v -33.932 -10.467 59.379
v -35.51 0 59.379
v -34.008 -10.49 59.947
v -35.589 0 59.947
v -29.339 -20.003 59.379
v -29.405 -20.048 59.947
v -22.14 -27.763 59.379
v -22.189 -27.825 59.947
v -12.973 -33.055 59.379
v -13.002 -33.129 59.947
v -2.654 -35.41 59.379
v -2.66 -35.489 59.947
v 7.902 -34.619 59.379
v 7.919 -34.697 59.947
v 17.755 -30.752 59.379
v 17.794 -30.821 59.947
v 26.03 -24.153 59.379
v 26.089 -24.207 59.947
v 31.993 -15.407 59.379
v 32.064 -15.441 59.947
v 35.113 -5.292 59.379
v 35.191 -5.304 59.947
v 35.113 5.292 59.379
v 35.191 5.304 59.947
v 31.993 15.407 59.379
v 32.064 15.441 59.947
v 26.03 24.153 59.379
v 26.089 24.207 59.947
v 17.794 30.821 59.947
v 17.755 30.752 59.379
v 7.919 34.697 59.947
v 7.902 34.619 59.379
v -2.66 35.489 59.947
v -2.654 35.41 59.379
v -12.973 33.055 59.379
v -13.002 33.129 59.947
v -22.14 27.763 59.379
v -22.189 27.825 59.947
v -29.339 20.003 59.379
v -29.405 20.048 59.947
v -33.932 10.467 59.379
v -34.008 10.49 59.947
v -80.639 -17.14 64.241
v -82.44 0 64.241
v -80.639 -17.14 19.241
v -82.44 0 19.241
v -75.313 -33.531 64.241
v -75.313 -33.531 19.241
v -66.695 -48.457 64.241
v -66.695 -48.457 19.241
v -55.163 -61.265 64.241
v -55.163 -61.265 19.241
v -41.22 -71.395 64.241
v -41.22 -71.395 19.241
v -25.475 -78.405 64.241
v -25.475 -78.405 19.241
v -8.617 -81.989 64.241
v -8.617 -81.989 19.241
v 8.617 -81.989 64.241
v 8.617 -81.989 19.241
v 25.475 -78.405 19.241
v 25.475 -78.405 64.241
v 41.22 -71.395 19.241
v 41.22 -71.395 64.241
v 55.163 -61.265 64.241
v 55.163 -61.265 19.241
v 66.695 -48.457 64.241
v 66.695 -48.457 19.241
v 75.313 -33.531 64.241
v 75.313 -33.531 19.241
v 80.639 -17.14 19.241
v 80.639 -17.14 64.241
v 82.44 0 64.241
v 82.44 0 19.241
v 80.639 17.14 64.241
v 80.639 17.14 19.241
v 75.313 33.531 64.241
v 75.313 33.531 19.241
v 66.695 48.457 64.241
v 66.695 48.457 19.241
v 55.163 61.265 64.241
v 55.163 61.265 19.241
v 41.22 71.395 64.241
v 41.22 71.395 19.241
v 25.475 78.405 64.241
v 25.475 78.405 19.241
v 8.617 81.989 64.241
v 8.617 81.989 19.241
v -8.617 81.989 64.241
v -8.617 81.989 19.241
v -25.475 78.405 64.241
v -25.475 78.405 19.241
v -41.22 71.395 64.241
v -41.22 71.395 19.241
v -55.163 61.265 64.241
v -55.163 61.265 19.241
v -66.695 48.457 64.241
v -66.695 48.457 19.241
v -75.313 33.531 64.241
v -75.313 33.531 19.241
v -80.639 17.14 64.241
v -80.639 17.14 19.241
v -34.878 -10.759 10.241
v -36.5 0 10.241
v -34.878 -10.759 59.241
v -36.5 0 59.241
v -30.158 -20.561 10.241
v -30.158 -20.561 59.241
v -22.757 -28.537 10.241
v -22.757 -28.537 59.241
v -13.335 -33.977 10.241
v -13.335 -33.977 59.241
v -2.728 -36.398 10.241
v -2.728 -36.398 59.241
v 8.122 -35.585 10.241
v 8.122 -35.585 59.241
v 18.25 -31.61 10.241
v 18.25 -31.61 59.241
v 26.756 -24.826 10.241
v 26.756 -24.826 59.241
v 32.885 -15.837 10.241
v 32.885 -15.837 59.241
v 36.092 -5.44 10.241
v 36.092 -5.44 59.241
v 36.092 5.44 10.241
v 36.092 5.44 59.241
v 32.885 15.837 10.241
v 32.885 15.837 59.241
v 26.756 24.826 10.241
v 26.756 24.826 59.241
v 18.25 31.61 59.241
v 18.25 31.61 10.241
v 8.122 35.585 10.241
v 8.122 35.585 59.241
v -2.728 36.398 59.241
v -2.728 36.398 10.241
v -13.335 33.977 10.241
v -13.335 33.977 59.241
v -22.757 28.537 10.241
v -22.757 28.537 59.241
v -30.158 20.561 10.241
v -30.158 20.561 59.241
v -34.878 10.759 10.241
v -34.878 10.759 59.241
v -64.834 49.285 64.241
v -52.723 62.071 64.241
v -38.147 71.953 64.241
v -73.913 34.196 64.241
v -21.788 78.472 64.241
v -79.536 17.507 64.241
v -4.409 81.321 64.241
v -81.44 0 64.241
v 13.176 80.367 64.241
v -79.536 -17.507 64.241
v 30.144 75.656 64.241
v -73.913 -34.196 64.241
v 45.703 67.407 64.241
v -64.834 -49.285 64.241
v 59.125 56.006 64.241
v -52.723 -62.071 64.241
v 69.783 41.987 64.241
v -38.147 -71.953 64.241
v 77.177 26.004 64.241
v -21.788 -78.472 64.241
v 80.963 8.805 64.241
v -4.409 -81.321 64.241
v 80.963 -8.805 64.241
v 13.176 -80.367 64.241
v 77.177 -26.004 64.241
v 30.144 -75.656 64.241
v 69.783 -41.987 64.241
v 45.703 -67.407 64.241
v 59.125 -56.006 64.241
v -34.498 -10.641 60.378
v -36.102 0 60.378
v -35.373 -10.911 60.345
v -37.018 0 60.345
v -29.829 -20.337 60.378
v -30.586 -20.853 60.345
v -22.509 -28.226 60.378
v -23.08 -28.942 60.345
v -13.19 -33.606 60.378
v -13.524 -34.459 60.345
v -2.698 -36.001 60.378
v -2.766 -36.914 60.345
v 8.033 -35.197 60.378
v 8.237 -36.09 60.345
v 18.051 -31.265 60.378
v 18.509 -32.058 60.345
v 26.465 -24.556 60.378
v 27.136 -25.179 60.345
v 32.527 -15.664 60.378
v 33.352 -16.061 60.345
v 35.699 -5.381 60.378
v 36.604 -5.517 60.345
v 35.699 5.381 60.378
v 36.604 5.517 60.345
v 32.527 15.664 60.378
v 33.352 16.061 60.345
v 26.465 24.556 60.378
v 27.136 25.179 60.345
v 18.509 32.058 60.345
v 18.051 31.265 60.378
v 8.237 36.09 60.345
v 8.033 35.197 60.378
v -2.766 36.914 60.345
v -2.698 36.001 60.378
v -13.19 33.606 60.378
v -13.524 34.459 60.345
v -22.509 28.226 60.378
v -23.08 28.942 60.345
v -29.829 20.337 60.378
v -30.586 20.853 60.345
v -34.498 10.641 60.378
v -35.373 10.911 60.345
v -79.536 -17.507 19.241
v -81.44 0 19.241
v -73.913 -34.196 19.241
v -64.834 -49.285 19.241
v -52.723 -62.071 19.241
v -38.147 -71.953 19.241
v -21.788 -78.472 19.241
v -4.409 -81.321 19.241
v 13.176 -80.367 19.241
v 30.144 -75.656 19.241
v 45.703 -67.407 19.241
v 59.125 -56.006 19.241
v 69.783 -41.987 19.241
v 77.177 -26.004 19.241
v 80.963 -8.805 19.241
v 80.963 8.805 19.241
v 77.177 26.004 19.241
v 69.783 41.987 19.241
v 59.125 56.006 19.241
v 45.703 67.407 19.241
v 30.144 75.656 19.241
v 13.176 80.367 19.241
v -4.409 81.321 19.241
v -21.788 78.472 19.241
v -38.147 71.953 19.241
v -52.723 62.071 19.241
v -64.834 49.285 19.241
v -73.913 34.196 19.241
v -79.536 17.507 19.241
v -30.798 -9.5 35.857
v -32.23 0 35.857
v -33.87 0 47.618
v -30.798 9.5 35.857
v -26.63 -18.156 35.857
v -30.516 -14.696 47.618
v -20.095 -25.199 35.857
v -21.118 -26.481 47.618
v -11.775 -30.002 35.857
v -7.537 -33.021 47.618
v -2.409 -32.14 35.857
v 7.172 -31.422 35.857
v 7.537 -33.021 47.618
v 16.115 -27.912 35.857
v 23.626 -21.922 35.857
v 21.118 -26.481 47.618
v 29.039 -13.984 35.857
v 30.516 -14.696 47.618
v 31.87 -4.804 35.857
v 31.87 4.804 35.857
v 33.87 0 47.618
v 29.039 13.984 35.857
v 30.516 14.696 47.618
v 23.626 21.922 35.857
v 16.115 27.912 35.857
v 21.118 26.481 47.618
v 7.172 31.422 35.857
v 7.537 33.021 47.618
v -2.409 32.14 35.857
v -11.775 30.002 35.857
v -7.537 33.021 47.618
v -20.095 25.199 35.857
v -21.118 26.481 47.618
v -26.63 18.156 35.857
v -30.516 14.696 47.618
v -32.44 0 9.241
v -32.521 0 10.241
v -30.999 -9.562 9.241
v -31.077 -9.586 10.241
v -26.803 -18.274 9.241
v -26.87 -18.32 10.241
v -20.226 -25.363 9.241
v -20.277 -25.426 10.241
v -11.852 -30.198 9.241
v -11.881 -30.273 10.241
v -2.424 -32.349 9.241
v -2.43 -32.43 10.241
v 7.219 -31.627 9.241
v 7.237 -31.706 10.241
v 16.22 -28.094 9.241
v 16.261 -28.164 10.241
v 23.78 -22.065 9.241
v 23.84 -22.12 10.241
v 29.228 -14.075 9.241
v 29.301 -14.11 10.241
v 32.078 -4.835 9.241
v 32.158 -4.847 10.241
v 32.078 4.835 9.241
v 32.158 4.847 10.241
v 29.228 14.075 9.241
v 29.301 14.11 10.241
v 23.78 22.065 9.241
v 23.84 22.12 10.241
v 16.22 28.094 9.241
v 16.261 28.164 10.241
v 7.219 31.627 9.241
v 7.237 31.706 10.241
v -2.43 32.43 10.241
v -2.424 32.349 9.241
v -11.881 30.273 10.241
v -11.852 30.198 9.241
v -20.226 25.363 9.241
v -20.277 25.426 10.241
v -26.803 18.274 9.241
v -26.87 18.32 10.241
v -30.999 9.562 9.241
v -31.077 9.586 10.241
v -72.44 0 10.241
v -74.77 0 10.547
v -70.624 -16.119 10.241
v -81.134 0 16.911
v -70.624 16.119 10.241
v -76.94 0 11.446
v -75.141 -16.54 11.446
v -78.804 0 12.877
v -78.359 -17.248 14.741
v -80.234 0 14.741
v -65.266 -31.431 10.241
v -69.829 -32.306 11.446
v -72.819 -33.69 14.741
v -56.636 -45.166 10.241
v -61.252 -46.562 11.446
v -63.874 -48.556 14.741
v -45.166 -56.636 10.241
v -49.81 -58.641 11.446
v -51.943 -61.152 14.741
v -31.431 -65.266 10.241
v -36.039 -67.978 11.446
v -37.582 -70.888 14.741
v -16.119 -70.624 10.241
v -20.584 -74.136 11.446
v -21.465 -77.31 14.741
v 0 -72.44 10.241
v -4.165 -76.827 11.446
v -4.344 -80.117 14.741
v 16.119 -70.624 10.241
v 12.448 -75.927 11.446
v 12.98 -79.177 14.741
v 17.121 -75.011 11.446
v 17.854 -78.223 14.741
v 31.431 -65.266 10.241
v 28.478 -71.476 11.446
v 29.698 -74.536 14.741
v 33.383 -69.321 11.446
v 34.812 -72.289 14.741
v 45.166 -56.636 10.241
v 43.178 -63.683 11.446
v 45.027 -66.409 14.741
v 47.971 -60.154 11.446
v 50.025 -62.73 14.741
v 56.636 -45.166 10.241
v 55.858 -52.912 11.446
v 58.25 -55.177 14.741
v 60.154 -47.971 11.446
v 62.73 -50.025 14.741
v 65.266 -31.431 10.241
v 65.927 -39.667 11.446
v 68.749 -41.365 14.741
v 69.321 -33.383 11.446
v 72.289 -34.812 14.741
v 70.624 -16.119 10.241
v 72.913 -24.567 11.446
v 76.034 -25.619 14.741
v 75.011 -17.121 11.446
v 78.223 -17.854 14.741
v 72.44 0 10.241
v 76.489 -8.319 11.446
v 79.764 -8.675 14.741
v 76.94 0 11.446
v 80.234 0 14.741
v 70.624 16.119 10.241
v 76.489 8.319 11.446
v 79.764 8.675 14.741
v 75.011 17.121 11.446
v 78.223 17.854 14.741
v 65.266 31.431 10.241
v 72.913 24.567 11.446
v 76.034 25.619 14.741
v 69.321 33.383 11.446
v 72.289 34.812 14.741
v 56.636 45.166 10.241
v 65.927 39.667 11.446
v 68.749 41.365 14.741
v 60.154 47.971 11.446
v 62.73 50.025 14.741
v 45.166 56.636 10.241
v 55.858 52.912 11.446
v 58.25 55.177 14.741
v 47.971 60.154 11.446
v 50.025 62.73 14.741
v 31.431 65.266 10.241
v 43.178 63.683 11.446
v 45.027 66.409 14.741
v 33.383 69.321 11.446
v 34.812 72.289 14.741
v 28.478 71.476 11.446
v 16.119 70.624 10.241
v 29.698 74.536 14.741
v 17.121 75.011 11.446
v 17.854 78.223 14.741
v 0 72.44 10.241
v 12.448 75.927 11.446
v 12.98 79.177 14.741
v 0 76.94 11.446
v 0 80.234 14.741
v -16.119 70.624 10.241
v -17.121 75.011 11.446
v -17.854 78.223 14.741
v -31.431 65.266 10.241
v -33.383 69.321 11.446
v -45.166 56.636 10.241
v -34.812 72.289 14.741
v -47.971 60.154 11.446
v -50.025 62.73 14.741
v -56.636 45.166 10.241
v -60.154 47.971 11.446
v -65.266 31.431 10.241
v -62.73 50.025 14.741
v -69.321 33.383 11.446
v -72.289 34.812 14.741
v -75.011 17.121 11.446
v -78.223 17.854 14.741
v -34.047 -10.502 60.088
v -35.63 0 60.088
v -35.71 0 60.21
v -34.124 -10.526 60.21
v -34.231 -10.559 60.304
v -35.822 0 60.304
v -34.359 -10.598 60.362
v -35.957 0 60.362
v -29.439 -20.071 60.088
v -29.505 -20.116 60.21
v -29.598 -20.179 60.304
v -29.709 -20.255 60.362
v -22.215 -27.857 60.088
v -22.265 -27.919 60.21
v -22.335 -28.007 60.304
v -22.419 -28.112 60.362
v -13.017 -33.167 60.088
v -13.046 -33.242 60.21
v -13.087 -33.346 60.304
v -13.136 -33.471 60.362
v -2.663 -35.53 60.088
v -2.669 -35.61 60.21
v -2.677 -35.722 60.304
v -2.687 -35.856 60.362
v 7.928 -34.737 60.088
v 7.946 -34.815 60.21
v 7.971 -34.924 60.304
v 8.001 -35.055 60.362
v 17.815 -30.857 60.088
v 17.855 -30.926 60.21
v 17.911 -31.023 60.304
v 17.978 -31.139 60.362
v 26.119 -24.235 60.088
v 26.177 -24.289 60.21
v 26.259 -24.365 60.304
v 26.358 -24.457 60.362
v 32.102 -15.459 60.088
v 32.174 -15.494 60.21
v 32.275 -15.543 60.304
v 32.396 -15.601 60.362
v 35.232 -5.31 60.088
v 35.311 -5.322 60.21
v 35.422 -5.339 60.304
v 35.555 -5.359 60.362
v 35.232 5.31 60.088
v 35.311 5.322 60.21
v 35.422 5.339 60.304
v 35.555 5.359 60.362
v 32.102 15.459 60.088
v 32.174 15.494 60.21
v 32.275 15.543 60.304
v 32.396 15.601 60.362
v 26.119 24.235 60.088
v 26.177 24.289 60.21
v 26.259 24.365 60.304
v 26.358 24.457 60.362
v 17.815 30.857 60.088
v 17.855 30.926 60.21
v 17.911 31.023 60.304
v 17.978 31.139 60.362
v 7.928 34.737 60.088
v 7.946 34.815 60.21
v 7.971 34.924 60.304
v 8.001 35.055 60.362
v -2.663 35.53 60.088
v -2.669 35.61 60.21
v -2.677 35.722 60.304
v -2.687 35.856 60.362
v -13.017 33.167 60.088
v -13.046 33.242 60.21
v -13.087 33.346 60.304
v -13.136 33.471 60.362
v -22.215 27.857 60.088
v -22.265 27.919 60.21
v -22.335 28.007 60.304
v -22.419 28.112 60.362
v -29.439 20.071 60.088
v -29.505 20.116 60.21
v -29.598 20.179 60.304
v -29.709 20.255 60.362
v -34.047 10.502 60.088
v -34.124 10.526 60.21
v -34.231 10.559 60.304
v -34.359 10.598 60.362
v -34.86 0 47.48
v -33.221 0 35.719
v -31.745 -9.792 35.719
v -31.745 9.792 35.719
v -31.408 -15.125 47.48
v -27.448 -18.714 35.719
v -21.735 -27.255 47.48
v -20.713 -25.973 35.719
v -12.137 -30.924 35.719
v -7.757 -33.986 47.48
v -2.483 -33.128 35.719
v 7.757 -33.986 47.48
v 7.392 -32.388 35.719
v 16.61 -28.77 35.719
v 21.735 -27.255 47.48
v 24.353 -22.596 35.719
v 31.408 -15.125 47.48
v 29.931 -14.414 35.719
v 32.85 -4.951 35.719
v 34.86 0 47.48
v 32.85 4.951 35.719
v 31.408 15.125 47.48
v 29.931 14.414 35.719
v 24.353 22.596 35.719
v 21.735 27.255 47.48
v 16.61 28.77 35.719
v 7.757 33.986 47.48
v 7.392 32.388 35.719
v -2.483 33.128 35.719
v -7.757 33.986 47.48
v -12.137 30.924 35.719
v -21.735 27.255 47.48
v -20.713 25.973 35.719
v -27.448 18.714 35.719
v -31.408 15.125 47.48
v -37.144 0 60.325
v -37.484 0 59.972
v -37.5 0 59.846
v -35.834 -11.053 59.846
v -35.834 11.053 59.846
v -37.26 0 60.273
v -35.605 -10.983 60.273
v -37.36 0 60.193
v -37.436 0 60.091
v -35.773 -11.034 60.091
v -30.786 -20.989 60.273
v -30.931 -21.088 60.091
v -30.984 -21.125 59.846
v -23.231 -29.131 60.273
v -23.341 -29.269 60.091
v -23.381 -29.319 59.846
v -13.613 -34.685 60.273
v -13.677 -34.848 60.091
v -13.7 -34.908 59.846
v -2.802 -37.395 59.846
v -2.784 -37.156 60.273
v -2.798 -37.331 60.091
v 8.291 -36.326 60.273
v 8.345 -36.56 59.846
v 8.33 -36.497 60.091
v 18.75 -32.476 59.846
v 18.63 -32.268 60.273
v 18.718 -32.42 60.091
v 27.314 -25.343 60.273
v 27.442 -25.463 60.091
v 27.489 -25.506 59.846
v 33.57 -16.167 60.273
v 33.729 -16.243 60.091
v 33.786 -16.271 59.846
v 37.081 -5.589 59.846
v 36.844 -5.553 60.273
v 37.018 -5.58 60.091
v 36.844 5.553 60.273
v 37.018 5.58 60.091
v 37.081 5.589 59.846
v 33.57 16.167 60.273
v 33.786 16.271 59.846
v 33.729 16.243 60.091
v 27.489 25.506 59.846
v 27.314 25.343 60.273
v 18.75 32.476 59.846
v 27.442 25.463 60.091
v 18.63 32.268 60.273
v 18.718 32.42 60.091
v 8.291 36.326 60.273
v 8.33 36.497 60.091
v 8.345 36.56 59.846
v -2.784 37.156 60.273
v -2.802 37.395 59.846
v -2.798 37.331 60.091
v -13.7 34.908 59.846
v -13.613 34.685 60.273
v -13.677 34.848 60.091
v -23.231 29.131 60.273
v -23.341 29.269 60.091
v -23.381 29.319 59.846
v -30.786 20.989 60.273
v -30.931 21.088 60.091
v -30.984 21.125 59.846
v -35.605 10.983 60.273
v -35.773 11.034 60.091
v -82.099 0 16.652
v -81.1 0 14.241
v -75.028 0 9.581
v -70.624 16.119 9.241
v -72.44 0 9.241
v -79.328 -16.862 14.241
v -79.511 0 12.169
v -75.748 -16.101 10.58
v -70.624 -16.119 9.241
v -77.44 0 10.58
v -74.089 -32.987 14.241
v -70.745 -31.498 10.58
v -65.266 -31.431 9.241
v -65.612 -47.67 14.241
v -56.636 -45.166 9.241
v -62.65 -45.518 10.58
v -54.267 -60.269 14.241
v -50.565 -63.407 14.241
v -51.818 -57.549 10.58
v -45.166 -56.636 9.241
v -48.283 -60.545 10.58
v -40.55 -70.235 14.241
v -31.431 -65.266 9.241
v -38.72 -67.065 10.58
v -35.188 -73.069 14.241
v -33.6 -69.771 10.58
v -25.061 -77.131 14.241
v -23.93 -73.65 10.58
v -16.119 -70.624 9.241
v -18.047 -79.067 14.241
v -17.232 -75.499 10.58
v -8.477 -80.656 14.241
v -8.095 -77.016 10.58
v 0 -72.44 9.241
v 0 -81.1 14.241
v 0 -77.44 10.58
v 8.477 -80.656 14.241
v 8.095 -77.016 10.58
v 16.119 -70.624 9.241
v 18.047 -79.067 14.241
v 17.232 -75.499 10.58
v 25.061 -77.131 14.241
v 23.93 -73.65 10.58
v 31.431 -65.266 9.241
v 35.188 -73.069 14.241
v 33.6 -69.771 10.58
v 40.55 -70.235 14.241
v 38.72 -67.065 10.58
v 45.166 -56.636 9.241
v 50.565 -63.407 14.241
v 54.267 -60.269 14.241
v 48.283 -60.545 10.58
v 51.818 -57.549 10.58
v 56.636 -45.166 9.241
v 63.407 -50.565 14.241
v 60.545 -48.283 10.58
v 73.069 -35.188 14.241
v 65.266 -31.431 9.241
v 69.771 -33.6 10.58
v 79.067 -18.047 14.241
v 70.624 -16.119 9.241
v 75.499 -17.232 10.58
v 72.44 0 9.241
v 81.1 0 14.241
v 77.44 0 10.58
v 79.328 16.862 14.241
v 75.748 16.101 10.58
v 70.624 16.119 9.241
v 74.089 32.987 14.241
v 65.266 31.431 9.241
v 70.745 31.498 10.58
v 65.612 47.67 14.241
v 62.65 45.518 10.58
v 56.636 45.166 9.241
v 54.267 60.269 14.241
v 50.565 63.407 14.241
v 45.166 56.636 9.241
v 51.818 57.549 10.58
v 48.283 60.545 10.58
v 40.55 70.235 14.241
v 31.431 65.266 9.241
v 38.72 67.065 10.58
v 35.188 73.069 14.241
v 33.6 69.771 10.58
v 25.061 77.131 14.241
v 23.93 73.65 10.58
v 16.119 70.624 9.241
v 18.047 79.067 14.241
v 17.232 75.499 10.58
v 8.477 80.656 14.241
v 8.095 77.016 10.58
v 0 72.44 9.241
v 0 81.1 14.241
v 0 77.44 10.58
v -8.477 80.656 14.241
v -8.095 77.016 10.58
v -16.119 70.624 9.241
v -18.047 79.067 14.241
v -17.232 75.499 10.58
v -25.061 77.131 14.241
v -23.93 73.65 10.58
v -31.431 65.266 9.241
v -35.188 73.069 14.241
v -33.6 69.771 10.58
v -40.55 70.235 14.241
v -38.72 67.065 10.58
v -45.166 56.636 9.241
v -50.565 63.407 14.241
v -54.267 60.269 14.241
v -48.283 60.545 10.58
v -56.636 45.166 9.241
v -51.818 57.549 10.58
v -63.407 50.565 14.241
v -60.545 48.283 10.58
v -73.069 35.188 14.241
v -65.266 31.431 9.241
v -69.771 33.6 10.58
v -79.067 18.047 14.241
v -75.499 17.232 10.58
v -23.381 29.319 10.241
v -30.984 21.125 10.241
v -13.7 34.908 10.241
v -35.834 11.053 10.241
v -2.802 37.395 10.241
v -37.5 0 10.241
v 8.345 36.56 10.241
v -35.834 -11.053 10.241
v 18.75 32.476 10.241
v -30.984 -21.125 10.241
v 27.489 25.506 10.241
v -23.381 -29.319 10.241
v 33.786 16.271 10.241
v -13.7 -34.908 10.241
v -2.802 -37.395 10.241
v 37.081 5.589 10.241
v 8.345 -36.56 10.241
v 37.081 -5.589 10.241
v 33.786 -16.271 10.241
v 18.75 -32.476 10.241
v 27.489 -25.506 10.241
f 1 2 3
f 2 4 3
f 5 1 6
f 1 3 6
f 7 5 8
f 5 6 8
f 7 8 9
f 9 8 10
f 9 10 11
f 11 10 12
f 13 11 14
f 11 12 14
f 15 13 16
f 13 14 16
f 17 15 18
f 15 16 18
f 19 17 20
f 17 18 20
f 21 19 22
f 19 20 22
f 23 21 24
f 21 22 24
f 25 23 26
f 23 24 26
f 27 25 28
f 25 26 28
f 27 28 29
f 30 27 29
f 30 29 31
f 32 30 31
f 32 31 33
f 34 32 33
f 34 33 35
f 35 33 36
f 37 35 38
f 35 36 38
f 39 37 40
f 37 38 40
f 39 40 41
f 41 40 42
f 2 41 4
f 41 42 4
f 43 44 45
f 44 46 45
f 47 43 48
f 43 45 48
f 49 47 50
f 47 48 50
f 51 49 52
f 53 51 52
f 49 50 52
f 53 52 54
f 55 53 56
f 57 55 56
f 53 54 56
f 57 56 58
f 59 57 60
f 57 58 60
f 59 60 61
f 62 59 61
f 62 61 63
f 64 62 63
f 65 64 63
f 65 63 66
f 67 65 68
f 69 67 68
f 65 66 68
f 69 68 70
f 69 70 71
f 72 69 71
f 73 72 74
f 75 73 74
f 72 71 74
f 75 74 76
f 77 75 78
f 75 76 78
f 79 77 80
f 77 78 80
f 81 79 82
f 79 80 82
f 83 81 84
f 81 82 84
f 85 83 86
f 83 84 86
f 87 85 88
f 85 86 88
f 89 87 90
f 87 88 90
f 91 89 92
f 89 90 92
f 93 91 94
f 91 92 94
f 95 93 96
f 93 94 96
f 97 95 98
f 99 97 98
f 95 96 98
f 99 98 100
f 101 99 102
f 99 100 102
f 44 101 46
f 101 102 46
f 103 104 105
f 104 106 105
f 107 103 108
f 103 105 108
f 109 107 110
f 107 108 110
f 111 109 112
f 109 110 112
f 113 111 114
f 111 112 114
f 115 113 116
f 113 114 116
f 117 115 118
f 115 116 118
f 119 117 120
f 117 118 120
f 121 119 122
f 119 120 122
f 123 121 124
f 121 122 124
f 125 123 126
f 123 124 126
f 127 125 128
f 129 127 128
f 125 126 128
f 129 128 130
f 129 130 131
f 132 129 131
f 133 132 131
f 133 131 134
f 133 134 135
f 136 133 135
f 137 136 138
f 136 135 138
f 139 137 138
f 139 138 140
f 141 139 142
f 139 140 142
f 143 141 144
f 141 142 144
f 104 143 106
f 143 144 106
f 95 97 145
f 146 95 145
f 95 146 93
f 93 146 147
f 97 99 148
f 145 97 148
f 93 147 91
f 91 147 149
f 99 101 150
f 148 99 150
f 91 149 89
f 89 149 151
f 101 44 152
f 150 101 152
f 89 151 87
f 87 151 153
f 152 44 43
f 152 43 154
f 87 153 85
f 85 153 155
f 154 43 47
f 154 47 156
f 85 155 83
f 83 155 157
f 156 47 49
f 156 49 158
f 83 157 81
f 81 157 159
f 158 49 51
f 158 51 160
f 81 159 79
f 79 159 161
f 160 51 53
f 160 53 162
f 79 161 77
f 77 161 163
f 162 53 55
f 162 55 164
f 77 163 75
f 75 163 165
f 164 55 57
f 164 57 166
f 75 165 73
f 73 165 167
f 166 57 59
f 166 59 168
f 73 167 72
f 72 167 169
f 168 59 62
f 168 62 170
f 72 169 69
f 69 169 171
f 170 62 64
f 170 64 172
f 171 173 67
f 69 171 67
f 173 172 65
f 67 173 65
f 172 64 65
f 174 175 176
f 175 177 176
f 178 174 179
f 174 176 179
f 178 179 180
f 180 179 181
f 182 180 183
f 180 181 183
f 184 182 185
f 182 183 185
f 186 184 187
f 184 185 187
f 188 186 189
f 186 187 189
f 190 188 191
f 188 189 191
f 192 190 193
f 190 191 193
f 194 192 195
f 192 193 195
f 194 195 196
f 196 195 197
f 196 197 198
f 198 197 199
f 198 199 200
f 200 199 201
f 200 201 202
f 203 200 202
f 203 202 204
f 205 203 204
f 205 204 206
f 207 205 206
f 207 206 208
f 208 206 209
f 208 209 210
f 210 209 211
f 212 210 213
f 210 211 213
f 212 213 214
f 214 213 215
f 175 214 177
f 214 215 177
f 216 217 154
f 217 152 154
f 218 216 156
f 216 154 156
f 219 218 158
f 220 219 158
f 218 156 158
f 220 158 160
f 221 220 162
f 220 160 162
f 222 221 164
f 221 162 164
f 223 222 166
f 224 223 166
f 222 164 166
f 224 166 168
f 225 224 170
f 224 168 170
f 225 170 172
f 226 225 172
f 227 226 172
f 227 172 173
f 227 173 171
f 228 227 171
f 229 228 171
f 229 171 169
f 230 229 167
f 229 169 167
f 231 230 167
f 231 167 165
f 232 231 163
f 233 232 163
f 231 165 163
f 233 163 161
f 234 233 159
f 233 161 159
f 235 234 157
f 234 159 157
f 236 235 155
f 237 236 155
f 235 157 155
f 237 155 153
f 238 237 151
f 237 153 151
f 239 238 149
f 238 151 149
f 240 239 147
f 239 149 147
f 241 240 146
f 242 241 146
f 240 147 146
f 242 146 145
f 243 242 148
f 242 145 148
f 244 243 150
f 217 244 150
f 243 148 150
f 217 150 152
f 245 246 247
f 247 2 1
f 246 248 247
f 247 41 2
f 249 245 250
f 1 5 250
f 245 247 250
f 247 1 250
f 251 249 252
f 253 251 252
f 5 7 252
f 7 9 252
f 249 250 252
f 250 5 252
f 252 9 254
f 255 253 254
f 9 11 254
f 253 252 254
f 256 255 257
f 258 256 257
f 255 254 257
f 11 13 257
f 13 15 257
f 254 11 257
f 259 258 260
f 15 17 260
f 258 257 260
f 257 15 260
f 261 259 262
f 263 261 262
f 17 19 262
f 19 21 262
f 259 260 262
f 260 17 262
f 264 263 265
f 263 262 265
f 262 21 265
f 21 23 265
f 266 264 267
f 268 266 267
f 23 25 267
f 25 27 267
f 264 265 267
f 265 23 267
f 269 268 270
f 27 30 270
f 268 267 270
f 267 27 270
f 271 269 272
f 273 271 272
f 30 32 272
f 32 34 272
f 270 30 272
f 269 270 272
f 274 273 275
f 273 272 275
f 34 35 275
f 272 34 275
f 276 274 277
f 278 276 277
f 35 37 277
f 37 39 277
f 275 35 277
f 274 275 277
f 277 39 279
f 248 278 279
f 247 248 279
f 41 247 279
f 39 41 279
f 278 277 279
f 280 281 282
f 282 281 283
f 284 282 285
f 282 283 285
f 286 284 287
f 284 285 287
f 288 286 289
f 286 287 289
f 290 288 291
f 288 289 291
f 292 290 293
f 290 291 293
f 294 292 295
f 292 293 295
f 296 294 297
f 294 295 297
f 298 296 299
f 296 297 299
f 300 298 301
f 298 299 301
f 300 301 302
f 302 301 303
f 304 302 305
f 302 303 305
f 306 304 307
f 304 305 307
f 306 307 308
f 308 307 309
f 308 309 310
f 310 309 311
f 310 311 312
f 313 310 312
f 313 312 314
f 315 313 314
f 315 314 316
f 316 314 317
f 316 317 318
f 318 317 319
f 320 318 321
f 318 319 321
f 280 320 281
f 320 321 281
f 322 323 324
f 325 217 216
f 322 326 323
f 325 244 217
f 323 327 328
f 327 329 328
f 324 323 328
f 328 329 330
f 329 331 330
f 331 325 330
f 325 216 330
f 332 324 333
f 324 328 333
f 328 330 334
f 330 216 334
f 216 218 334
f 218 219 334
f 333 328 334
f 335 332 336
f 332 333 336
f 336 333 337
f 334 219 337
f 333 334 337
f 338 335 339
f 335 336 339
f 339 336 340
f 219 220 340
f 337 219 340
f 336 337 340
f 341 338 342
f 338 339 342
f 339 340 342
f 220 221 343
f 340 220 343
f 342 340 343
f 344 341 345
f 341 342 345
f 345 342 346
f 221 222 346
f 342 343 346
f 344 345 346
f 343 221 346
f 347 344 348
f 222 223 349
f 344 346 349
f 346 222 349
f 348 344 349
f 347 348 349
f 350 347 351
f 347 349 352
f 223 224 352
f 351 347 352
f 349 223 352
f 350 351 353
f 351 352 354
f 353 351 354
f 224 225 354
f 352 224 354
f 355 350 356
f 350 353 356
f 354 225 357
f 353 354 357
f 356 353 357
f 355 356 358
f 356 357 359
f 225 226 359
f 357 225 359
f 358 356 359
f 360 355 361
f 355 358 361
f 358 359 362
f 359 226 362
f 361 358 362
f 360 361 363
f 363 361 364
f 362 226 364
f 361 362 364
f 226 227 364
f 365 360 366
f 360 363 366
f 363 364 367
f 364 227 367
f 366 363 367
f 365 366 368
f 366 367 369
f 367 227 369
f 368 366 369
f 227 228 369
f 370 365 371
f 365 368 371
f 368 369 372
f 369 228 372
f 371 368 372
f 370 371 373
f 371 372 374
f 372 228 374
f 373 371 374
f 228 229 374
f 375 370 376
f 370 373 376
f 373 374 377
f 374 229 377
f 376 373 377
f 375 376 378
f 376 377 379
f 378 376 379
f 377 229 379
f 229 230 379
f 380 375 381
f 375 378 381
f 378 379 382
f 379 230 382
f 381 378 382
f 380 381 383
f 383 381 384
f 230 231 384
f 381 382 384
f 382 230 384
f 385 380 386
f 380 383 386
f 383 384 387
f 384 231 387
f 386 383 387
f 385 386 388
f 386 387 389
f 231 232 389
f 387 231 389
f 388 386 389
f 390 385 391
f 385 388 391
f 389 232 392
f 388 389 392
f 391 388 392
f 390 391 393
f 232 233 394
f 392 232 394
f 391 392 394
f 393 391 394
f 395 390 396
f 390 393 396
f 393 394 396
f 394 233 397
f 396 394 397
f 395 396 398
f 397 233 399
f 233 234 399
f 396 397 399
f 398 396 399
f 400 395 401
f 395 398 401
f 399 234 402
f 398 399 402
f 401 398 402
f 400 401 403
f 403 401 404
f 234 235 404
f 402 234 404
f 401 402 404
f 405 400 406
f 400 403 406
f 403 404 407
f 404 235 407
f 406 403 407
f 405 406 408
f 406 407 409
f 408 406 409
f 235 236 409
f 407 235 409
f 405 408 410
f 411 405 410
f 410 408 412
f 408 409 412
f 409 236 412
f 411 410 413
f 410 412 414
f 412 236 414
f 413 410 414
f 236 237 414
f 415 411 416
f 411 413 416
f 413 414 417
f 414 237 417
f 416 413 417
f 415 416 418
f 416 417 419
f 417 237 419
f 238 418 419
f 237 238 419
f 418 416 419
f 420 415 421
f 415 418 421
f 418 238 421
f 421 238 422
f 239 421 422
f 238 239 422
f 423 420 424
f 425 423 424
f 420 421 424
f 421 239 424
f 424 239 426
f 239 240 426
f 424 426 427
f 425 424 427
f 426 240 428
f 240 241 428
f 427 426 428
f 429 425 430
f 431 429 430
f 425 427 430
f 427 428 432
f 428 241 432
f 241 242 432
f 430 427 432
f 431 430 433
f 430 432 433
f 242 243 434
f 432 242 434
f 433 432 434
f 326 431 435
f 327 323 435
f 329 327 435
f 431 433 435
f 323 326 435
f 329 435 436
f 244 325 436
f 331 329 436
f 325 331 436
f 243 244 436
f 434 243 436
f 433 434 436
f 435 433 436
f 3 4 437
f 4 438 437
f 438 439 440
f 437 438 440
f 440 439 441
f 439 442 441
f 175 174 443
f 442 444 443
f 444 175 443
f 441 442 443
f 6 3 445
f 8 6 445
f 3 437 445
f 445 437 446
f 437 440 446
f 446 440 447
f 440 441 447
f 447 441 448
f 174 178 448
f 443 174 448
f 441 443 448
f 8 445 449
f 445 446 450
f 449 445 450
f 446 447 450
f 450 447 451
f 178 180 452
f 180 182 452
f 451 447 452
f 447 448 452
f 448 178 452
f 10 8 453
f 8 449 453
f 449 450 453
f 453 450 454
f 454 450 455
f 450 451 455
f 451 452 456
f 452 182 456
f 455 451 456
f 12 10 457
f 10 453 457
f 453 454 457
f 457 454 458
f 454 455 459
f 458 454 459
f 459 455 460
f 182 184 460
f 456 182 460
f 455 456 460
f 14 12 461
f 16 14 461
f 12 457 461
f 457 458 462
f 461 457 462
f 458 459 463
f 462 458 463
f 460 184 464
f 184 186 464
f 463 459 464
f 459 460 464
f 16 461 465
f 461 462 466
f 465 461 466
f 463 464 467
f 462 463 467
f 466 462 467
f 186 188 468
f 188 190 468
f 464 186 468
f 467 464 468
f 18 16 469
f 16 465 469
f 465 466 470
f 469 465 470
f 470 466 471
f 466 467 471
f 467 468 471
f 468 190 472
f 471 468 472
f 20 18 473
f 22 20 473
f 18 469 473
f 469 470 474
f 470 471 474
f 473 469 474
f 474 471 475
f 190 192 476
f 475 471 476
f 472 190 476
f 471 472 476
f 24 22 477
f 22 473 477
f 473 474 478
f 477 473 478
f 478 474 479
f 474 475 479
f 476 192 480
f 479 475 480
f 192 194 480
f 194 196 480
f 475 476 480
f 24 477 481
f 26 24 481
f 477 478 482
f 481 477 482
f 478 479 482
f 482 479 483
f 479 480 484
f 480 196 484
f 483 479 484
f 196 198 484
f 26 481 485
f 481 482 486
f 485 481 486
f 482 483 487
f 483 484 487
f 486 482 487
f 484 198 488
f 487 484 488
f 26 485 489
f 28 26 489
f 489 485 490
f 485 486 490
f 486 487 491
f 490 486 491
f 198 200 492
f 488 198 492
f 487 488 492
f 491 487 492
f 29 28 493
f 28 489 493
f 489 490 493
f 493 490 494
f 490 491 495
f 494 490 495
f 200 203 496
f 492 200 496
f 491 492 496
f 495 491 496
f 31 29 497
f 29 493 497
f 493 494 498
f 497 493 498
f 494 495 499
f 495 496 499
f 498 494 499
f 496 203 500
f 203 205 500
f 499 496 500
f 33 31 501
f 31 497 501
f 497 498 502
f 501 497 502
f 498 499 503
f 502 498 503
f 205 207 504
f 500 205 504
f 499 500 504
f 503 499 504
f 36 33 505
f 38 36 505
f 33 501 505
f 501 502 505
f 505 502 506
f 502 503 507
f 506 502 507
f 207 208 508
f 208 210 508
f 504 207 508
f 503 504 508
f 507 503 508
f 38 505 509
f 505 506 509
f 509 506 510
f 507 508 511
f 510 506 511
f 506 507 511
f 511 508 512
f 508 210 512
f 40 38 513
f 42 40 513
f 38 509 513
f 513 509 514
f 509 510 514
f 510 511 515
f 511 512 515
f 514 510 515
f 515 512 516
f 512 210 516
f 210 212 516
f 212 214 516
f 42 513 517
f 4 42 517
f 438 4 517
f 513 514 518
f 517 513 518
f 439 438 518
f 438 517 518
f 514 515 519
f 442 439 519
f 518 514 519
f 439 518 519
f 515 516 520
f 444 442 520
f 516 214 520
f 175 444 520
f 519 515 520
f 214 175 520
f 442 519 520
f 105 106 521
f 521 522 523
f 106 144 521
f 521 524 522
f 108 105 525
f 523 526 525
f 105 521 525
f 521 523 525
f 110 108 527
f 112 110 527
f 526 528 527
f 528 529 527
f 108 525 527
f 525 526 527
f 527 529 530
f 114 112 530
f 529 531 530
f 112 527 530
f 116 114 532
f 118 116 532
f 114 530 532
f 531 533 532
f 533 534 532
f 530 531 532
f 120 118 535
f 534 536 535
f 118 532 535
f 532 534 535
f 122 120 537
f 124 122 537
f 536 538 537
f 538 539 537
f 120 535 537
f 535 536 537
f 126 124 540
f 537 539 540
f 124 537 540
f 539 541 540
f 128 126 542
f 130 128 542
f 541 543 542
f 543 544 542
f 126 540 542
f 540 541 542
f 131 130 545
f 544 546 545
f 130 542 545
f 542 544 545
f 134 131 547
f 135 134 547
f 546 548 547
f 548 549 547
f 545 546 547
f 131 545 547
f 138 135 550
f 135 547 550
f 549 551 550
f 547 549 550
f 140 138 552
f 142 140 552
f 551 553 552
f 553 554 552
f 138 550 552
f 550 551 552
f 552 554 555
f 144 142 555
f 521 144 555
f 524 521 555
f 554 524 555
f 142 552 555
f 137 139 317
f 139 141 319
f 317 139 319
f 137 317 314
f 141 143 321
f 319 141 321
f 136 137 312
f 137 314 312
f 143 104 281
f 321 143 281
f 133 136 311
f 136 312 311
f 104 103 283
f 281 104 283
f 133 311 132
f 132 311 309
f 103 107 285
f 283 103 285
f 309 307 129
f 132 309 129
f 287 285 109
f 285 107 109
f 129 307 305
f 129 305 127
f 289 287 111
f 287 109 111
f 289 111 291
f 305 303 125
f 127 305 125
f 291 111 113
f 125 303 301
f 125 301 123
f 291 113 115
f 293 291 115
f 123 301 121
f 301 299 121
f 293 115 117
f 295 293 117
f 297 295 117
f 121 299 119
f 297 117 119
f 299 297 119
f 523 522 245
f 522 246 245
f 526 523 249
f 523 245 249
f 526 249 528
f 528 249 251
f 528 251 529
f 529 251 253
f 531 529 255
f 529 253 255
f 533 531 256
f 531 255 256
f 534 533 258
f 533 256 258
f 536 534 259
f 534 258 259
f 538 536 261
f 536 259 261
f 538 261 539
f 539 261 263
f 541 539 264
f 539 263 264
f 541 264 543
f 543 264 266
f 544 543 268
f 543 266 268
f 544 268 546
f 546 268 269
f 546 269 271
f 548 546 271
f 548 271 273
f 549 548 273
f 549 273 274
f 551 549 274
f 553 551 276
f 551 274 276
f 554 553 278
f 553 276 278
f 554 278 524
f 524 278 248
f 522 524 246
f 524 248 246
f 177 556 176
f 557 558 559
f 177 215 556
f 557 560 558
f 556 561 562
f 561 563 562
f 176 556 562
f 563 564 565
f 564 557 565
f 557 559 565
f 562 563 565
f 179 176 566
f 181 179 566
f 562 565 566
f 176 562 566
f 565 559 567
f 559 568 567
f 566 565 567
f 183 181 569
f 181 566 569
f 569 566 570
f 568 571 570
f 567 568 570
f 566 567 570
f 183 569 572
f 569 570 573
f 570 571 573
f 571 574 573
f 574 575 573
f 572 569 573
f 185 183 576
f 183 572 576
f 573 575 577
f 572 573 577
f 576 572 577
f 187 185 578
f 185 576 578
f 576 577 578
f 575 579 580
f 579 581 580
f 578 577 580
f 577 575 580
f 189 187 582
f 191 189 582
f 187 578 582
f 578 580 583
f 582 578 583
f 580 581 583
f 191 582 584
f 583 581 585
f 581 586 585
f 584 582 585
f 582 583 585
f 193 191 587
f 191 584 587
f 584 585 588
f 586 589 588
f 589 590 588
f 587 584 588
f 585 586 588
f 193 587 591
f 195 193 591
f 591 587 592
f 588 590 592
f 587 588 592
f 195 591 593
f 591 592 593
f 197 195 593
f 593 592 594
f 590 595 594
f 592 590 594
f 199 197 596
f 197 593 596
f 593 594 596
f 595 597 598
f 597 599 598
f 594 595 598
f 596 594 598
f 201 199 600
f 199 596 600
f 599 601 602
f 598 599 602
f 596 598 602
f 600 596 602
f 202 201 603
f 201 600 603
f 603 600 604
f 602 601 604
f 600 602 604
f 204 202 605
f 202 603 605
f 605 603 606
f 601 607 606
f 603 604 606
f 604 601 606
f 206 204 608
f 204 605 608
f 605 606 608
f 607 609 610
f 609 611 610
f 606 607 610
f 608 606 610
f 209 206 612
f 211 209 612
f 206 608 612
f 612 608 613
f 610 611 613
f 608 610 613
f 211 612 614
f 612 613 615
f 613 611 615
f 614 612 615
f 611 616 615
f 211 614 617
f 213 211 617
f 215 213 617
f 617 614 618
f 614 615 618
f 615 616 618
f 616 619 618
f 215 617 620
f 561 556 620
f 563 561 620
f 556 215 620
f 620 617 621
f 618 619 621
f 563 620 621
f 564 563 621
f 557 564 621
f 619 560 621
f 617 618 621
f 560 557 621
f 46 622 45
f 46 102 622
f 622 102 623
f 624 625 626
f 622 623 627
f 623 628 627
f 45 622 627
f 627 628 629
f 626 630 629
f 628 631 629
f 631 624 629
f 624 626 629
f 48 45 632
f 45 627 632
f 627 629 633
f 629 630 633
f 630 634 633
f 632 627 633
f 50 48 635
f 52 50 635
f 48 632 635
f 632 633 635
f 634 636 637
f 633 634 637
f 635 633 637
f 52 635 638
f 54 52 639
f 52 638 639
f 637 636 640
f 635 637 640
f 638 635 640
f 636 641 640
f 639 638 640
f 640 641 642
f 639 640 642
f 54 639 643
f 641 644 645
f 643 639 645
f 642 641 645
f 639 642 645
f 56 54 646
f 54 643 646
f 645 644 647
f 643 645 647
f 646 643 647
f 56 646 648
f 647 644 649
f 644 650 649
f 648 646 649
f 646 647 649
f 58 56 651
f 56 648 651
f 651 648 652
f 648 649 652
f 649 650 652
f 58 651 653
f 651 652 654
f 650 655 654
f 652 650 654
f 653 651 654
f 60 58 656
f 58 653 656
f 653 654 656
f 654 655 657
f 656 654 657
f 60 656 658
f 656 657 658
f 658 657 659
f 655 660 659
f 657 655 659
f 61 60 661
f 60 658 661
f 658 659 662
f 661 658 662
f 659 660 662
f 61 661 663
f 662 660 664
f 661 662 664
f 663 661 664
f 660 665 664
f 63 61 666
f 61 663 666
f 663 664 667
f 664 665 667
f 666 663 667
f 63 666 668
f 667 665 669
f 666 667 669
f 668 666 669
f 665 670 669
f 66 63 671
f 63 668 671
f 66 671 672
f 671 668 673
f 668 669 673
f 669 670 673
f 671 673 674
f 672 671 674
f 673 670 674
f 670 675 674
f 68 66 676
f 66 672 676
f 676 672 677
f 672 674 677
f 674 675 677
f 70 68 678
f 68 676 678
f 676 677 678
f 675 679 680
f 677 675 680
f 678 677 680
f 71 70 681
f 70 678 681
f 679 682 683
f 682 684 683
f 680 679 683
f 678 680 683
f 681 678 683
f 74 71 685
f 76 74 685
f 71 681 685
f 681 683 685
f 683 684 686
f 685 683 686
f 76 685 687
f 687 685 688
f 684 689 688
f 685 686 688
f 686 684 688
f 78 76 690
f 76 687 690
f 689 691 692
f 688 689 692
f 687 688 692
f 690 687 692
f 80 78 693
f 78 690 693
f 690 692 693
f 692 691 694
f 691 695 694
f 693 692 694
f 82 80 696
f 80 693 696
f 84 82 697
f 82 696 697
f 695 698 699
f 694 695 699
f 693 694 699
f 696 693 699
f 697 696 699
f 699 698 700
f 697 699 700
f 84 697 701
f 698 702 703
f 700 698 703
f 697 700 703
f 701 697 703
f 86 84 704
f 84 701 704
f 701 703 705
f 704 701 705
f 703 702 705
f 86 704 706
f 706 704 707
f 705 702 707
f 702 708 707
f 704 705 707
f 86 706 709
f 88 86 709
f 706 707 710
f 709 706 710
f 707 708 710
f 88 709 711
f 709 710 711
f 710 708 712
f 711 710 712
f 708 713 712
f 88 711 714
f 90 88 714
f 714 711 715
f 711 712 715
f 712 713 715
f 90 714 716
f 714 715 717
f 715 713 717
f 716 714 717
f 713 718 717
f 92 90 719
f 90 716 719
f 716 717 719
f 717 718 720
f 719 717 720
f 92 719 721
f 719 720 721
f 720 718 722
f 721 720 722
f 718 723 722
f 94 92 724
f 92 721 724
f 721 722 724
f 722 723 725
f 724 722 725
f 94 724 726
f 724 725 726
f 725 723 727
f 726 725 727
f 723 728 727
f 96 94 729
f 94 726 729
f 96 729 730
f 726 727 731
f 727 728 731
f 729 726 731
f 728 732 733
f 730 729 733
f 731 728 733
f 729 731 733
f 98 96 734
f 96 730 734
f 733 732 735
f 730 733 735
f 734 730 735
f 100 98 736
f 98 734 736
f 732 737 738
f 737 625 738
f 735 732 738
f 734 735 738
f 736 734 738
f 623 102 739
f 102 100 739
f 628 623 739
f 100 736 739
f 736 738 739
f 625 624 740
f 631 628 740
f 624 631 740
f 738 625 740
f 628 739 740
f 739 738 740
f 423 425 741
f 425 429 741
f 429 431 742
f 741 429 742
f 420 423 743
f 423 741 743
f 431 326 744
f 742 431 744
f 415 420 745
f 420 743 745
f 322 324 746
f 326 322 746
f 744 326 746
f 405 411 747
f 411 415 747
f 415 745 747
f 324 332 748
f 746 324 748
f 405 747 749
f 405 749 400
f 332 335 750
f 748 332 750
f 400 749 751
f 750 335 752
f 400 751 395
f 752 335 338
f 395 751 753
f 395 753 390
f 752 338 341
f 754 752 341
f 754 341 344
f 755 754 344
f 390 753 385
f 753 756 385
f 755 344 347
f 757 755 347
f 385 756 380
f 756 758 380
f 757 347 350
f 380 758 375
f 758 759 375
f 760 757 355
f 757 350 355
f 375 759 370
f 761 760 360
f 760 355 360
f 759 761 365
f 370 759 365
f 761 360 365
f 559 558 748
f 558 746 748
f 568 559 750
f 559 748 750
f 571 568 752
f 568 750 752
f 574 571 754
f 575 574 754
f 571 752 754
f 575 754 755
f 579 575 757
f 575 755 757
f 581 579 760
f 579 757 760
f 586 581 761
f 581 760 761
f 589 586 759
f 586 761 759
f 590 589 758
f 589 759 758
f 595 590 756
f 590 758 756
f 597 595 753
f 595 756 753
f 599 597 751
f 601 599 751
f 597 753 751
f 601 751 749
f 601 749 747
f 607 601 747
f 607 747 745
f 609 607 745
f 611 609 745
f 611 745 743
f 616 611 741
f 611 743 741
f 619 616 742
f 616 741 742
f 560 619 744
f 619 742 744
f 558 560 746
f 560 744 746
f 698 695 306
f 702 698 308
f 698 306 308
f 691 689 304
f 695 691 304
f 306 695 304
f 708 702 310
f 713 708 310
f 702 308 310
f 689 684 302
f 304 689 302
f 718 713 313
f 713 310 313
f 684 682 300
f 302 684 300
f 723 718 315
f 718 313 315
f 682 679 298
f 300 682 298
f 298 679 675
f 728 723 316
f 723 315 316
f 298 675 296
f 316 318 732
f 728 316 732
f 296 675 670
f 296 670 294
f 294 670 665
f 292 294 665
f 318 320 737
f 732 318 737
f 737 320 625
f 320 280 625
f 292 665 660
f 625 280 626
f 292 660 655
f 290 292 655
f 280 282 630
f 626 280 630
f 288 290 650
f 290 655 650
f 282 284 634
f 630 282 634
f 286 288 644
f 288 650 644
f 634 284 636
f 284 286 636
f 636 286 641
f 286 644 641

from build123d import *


with BuildPart() as f1:
    # F0 (on Front) → F1 (revolve)
    with BuildSketch(Plane.XZ):
        with BuildLine():
            Line((-32.440171, 9.240504), (-32.521368, 10.240504))
            Line((-32.521368, 10.240504), (-36.5, 10.240504))
            Line((-36.5, 10.240504), (-36.5, 59.240504))
            Line((-36.5, 59.240504), (-33.220742, 35.719246))
            Line((-33.220742, 35.719246), (-32.230321, 35.857327))
            Line((-32.230321, 35.857327), (-35.509579, 59.378585))
            Line((-35.509579, 59.378585), (-35.588887, 59.947439))
            ThreePointArc((-35.588887, 59.947439), (-35.762638, 60.261366), (-36.101928, 60.378081))
            Line((-36.101928, 60.378081), (-37.01783, 60.345398))
            ThreePointArc((-37.01783, 60.345398), (-37.359802, 60.192909), (-37.5, 59.845716))
            Line((-37.5, 59.845716), (-37.5, 59.240504))
            Line((-37.5, 59.240504), (-37.5, 10.240504))
            Line((-37.5, 10.240504), (-72.440171, 10.240504))
            ThreePointArc((-72.440171, 10.240504), (-78.804132, 12.876543), (-81.440171, 19.240504))
            Line((-81.440171, 19.240504), (-81.440171, 64.240504))
            Line((-81.440171, 64.240504), (-82.440171, 64.240504))
            Line((-82.440171, 64.240504), (-82.440171, 19.240504))
            ThreePointArc((-82.440171, 19.240504), (-79.511239, 12.169436), (-72.440171, 9.240504))
            Line((-72.440171, 9.240504), (-32.440171, 9.240504))
        make_face()
    revolve(axis=Axis((0, 0, 34.240504), (0, 0, 1)))


solid = f1.part
